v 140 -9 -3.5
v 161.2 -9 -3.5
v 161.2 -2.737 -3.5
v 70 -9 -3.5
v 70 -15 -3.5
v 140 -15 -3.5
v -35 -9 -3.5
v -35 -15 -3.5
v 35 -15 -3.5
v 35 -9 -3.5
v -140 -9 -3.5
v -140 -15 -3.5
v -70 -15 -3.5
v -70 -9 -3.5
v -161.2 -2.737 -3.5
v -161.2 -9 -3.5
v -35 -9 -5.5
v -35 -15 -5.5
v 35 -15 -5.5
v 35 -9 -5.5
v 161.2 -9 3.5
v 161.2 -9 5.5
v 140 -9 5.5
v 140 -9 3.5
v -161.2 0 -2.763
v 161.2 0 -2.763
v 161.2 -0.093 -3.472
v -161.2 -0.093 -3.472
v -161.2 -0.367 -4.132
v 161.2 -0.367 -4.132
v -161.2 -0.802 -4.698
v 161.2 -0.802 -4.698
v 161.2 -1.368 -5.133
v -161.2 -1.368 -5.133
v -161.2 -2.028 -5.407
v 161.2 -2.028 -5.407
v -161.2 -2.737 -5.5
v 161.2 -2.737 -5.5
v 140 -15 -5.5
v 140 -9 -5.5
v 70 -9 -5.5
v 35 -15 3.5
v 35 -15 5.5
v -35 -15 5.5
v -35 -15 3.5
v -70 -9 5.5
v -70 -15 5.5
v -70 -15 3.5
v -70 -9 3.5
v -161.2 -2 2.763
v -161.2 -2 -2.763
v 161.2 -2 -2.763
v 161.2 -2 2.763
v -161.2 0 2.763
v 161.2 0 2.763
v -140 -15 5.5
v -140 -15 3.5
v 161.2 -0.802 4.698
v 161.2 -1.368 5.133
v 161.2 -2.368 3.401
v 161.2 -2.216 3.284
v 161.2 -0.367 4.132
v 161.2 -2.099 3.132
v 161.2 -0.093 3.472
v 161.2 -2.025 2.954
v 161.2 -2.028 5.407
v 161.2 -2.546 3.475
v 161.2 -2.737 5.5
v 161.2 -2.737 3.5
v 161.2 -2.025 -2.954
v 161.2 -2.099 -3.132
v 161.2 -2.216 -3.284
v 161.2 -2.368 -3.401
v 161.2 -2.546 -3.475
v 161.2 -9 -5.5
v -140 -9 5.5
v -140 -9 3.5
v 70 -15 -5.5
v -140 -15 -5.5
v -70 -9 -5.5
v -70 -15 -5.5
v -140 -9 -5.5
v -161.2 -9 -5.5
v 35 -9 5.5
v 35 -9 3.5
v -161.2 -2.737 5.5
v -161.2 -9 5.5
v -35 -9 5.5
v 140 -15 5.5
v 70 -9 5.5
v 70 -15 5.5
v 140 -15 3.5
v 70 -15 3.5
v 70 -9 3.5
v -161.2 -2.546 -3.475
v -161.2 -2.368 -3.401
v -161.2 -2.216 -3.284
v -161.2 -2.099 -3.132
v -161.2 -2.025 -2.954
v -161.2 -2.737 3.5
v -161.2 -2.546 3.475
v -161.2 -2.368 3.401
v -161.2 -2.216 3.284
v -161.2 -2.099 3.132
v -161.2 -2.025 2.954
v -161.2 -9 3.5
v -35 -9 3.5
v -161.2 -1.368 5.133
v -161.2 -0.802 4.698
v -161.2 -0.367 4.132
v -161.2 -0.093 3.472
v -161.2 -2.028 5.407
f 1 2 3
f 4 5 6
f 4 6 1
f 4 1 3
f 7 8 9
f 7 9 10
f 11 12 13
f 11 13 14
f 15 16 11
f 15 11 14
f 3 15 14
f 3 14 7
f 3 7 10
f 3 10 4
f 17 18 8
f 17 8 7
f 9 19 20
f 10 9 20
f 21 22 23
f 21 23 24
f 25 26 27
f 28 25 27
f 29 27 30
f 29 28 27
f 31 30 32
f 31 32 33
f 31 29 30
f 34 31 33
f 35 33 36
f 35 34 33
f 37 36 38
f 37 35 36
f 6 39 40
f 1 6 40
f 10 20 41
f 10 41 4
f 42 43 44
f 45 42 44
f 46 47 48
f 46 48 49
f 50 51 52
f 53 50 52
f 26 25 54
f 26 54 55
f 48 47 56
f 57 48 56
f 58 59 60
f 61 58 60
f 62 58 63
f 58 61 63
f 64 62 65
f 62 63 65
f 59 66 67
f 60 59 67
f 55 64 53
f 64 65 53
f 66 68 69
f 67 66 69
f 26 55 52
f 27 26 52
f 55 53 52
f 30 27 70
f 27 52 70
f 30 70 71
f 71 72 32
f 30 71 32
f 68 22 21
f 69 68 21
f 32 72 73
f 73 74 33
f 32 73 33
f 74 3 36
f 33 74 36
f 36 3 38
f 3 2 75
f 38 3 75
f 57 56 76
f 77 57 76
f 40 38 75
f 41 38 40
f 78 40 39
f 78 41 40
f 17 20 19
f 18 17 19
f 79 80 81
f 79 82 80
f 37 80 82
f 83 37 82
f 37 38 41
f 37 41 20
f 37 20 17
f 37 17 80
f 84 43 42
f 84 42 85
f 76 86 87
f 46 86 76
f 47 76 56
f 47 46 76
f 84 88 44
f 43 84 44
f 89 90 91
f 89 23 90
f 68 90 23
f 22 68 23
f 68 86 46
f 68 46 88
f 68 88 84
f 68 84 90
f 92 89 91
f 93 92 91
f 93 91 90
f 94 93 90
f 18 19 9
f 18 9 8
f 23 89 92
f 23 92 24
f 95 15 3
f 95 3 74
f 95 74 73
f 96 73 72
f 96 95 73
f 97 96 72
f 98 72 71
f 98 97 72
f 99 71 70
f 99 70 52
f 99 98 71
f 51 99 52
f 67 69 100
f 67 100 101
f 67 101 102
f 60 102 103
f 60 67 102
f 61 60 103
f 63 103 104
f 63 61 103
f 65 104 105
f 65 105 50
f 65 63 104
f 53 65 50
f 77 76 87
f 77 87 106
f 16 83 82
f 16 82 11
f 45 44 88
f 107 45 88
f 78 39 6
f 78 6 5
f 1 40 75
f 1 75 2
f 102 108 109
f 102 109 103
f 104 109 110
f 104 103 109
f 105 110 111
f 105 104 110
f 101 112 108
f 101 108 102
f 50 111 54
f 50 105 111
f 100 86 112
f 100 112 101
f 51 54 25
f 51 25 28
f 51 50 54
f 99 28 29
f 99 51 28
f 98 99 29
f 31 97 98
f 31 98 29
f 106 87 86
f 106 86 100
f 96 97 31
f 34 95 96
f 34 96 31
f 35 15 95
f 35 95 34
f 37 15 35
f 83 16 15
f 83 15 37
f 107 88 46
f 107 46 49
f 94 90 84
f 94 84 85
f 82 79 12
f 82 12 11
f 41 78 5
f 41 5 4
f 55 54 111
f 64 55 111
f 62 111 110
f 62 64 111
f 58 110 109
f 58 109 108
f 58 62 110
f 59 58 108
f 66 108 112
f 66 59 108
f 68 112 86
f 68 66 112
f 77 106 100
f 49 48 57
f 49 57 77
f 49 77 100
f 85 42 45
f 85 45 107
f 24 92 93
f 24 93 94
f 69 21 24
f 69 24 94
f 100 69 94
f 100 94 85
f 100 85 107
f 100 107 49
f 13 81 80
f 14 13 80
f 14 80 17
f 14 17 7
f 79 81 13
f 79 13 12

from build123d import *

# Parameters (mm, degrees)
SKETCH2_W                      = 322.4
SKETCH2_H                      = 11
BASE_FLANGE1_DEPTH             = 2
EDGE_FLANGE1_STRIP_W           = 9.4732
EDGE_FLANGE1_STRIP_H           = 2
EDGE_FLANGE1_STRIP_CUT_DEPTH   = 322.4
EDGE_FLANGE1_STRIP_2_W         = 9.4732
EDGE_FLANGE1_STRIP_2_H         = 2
EDGE_FLANGE1_STRIP_CUT_2_DEPTH = 322.4
EDGE_FLANGE1_DEPTH             = 322.4
EDGE_FLANGE1_BEND_DEPTH        = 322.4
SKETCH15_W                     = 70
SKETCH15_H                     = 6
TAB1_DEPTH                     = 2


# Sheet-metal steps are written as plain solids
with BuildPart() as part:
    # Sketch2 → Base-Flange1 (new body)
    with BuildSketch(Plane(origin=(0, 0, 0), x_dir=(1, 0, 0), z_dir=(0, 1, 0))):
        Rectangle(SKETCH2_W, SKETCH2_H)
    extrude(amount=-BASE_FLANGE1_DEPTH)

    # Edge-Flange1 strip (across the edge) → Edge-Flange1 strip cut (cut)
    with BuildSketch(Plane(origin=(161.2, -2, 5.5), x_dir=(0, 0, -1), z_dir=(-1, 0, 0))):
        with Locations((-2, -1)):
            Rectangle(EDGE_FLANGE1_STRIP_W, EDGE_FLANGE1_STRIP_H)
    extrude(amount=EDGE_FLANGE1_STRIP_CUT_DEPTH, mode=Mode.SUBTRACT)

    # Edge-Flange1 strip 2 (across the edge) → Edge-Flange1 strip cut 2 (cut)
    with BuildSketch(Plane(origin=(-161.2, -2, -5.5), x_dir=(0, 0, 1), z_dir=(1, 0, 0))):
        with Locations((-2, -1)):
            Rectangle(EDGE_FLANGE1_STRIP_2_W, EDGE_FLANGE1_STRIP_2_H)
    extrude(amount=EDGE_FLANGE1_STRIP_CUT_2_DEPTH, mode=Mode.SUBTRACT)

    # Edge-Flange1 section (across the edge) → Edge-Flange1 (add)
    with BuildSketch(Plane(origin=(161.2, -2, 5.5), x_dir=(0, 0, -1), z_dir=(-1, 0, 0))):
        with BuildLine():
            Line((0, 0.7366), (0, 7))
            Line((0, 7), (2, 7))
            Line((2, 7), (2, 0.7366))
            ThreePointArc((2, 0.7366), (2.215745145, 0.215745145), (2.7366, 0))
            Line((2.7366, 0), (2.7366, -2))
            ThreePointArc((2.7366, -2), (0.801531583, -1.198468417), (0, 0.7366))
        make_face()
    extrude(amount=EDGE_FLANGE1_DEPTH)

    # Edge-Flange1 section 2 (across the edge) → Edge-Flange1 bend (add)
    with BuildSketch(Plane(origin=(-161.2, -2, -5.5), x_dir=(0, 0, 1), z_dir=(1, 0, 0))):
        with BuildLine():
            Line((0, 0.7366), (0, 7))
            Line((0, 7), (2, 7))
            Line((2, 7), (2, 0.7366))
            ThreePointArc((2, 0.7366), (2.215745145, 0.215745145), (2.7366, 0))
            Line((2.7366, 0), (2.7366, -2))
            ThreePointArc((2.7366, -2), (0.801531583, -1.198468417), (0, 0.7366))
        make_face()
    extrude(amount=EDGE_FLANGE1_BEND_DEPTH)

    # Sketch15 → Tab1 (add)
    with BuildSketch(Plane(origin=(0, 0, -5.5), x_dir=(-1, 0, 0), z_dir=(0, 0, -1))):
        with Locations((-105, -12)):
            Rectangle(SKETCH15_W, SKETCH15_H)
        with Locations((0, -12)):
            Rectangle(SKETCH15_W, SKETCH15_H)
        with Locations((105, -12)):
            Rectangle(SKETCH15_W, SKETCH15_H)
    tab1 = extrude(amount=-TAB1_DEPTH)

    # Mirror1: Tab1 across plane
    add(tab1.mirror(Plane.XY))


solid = part.part
